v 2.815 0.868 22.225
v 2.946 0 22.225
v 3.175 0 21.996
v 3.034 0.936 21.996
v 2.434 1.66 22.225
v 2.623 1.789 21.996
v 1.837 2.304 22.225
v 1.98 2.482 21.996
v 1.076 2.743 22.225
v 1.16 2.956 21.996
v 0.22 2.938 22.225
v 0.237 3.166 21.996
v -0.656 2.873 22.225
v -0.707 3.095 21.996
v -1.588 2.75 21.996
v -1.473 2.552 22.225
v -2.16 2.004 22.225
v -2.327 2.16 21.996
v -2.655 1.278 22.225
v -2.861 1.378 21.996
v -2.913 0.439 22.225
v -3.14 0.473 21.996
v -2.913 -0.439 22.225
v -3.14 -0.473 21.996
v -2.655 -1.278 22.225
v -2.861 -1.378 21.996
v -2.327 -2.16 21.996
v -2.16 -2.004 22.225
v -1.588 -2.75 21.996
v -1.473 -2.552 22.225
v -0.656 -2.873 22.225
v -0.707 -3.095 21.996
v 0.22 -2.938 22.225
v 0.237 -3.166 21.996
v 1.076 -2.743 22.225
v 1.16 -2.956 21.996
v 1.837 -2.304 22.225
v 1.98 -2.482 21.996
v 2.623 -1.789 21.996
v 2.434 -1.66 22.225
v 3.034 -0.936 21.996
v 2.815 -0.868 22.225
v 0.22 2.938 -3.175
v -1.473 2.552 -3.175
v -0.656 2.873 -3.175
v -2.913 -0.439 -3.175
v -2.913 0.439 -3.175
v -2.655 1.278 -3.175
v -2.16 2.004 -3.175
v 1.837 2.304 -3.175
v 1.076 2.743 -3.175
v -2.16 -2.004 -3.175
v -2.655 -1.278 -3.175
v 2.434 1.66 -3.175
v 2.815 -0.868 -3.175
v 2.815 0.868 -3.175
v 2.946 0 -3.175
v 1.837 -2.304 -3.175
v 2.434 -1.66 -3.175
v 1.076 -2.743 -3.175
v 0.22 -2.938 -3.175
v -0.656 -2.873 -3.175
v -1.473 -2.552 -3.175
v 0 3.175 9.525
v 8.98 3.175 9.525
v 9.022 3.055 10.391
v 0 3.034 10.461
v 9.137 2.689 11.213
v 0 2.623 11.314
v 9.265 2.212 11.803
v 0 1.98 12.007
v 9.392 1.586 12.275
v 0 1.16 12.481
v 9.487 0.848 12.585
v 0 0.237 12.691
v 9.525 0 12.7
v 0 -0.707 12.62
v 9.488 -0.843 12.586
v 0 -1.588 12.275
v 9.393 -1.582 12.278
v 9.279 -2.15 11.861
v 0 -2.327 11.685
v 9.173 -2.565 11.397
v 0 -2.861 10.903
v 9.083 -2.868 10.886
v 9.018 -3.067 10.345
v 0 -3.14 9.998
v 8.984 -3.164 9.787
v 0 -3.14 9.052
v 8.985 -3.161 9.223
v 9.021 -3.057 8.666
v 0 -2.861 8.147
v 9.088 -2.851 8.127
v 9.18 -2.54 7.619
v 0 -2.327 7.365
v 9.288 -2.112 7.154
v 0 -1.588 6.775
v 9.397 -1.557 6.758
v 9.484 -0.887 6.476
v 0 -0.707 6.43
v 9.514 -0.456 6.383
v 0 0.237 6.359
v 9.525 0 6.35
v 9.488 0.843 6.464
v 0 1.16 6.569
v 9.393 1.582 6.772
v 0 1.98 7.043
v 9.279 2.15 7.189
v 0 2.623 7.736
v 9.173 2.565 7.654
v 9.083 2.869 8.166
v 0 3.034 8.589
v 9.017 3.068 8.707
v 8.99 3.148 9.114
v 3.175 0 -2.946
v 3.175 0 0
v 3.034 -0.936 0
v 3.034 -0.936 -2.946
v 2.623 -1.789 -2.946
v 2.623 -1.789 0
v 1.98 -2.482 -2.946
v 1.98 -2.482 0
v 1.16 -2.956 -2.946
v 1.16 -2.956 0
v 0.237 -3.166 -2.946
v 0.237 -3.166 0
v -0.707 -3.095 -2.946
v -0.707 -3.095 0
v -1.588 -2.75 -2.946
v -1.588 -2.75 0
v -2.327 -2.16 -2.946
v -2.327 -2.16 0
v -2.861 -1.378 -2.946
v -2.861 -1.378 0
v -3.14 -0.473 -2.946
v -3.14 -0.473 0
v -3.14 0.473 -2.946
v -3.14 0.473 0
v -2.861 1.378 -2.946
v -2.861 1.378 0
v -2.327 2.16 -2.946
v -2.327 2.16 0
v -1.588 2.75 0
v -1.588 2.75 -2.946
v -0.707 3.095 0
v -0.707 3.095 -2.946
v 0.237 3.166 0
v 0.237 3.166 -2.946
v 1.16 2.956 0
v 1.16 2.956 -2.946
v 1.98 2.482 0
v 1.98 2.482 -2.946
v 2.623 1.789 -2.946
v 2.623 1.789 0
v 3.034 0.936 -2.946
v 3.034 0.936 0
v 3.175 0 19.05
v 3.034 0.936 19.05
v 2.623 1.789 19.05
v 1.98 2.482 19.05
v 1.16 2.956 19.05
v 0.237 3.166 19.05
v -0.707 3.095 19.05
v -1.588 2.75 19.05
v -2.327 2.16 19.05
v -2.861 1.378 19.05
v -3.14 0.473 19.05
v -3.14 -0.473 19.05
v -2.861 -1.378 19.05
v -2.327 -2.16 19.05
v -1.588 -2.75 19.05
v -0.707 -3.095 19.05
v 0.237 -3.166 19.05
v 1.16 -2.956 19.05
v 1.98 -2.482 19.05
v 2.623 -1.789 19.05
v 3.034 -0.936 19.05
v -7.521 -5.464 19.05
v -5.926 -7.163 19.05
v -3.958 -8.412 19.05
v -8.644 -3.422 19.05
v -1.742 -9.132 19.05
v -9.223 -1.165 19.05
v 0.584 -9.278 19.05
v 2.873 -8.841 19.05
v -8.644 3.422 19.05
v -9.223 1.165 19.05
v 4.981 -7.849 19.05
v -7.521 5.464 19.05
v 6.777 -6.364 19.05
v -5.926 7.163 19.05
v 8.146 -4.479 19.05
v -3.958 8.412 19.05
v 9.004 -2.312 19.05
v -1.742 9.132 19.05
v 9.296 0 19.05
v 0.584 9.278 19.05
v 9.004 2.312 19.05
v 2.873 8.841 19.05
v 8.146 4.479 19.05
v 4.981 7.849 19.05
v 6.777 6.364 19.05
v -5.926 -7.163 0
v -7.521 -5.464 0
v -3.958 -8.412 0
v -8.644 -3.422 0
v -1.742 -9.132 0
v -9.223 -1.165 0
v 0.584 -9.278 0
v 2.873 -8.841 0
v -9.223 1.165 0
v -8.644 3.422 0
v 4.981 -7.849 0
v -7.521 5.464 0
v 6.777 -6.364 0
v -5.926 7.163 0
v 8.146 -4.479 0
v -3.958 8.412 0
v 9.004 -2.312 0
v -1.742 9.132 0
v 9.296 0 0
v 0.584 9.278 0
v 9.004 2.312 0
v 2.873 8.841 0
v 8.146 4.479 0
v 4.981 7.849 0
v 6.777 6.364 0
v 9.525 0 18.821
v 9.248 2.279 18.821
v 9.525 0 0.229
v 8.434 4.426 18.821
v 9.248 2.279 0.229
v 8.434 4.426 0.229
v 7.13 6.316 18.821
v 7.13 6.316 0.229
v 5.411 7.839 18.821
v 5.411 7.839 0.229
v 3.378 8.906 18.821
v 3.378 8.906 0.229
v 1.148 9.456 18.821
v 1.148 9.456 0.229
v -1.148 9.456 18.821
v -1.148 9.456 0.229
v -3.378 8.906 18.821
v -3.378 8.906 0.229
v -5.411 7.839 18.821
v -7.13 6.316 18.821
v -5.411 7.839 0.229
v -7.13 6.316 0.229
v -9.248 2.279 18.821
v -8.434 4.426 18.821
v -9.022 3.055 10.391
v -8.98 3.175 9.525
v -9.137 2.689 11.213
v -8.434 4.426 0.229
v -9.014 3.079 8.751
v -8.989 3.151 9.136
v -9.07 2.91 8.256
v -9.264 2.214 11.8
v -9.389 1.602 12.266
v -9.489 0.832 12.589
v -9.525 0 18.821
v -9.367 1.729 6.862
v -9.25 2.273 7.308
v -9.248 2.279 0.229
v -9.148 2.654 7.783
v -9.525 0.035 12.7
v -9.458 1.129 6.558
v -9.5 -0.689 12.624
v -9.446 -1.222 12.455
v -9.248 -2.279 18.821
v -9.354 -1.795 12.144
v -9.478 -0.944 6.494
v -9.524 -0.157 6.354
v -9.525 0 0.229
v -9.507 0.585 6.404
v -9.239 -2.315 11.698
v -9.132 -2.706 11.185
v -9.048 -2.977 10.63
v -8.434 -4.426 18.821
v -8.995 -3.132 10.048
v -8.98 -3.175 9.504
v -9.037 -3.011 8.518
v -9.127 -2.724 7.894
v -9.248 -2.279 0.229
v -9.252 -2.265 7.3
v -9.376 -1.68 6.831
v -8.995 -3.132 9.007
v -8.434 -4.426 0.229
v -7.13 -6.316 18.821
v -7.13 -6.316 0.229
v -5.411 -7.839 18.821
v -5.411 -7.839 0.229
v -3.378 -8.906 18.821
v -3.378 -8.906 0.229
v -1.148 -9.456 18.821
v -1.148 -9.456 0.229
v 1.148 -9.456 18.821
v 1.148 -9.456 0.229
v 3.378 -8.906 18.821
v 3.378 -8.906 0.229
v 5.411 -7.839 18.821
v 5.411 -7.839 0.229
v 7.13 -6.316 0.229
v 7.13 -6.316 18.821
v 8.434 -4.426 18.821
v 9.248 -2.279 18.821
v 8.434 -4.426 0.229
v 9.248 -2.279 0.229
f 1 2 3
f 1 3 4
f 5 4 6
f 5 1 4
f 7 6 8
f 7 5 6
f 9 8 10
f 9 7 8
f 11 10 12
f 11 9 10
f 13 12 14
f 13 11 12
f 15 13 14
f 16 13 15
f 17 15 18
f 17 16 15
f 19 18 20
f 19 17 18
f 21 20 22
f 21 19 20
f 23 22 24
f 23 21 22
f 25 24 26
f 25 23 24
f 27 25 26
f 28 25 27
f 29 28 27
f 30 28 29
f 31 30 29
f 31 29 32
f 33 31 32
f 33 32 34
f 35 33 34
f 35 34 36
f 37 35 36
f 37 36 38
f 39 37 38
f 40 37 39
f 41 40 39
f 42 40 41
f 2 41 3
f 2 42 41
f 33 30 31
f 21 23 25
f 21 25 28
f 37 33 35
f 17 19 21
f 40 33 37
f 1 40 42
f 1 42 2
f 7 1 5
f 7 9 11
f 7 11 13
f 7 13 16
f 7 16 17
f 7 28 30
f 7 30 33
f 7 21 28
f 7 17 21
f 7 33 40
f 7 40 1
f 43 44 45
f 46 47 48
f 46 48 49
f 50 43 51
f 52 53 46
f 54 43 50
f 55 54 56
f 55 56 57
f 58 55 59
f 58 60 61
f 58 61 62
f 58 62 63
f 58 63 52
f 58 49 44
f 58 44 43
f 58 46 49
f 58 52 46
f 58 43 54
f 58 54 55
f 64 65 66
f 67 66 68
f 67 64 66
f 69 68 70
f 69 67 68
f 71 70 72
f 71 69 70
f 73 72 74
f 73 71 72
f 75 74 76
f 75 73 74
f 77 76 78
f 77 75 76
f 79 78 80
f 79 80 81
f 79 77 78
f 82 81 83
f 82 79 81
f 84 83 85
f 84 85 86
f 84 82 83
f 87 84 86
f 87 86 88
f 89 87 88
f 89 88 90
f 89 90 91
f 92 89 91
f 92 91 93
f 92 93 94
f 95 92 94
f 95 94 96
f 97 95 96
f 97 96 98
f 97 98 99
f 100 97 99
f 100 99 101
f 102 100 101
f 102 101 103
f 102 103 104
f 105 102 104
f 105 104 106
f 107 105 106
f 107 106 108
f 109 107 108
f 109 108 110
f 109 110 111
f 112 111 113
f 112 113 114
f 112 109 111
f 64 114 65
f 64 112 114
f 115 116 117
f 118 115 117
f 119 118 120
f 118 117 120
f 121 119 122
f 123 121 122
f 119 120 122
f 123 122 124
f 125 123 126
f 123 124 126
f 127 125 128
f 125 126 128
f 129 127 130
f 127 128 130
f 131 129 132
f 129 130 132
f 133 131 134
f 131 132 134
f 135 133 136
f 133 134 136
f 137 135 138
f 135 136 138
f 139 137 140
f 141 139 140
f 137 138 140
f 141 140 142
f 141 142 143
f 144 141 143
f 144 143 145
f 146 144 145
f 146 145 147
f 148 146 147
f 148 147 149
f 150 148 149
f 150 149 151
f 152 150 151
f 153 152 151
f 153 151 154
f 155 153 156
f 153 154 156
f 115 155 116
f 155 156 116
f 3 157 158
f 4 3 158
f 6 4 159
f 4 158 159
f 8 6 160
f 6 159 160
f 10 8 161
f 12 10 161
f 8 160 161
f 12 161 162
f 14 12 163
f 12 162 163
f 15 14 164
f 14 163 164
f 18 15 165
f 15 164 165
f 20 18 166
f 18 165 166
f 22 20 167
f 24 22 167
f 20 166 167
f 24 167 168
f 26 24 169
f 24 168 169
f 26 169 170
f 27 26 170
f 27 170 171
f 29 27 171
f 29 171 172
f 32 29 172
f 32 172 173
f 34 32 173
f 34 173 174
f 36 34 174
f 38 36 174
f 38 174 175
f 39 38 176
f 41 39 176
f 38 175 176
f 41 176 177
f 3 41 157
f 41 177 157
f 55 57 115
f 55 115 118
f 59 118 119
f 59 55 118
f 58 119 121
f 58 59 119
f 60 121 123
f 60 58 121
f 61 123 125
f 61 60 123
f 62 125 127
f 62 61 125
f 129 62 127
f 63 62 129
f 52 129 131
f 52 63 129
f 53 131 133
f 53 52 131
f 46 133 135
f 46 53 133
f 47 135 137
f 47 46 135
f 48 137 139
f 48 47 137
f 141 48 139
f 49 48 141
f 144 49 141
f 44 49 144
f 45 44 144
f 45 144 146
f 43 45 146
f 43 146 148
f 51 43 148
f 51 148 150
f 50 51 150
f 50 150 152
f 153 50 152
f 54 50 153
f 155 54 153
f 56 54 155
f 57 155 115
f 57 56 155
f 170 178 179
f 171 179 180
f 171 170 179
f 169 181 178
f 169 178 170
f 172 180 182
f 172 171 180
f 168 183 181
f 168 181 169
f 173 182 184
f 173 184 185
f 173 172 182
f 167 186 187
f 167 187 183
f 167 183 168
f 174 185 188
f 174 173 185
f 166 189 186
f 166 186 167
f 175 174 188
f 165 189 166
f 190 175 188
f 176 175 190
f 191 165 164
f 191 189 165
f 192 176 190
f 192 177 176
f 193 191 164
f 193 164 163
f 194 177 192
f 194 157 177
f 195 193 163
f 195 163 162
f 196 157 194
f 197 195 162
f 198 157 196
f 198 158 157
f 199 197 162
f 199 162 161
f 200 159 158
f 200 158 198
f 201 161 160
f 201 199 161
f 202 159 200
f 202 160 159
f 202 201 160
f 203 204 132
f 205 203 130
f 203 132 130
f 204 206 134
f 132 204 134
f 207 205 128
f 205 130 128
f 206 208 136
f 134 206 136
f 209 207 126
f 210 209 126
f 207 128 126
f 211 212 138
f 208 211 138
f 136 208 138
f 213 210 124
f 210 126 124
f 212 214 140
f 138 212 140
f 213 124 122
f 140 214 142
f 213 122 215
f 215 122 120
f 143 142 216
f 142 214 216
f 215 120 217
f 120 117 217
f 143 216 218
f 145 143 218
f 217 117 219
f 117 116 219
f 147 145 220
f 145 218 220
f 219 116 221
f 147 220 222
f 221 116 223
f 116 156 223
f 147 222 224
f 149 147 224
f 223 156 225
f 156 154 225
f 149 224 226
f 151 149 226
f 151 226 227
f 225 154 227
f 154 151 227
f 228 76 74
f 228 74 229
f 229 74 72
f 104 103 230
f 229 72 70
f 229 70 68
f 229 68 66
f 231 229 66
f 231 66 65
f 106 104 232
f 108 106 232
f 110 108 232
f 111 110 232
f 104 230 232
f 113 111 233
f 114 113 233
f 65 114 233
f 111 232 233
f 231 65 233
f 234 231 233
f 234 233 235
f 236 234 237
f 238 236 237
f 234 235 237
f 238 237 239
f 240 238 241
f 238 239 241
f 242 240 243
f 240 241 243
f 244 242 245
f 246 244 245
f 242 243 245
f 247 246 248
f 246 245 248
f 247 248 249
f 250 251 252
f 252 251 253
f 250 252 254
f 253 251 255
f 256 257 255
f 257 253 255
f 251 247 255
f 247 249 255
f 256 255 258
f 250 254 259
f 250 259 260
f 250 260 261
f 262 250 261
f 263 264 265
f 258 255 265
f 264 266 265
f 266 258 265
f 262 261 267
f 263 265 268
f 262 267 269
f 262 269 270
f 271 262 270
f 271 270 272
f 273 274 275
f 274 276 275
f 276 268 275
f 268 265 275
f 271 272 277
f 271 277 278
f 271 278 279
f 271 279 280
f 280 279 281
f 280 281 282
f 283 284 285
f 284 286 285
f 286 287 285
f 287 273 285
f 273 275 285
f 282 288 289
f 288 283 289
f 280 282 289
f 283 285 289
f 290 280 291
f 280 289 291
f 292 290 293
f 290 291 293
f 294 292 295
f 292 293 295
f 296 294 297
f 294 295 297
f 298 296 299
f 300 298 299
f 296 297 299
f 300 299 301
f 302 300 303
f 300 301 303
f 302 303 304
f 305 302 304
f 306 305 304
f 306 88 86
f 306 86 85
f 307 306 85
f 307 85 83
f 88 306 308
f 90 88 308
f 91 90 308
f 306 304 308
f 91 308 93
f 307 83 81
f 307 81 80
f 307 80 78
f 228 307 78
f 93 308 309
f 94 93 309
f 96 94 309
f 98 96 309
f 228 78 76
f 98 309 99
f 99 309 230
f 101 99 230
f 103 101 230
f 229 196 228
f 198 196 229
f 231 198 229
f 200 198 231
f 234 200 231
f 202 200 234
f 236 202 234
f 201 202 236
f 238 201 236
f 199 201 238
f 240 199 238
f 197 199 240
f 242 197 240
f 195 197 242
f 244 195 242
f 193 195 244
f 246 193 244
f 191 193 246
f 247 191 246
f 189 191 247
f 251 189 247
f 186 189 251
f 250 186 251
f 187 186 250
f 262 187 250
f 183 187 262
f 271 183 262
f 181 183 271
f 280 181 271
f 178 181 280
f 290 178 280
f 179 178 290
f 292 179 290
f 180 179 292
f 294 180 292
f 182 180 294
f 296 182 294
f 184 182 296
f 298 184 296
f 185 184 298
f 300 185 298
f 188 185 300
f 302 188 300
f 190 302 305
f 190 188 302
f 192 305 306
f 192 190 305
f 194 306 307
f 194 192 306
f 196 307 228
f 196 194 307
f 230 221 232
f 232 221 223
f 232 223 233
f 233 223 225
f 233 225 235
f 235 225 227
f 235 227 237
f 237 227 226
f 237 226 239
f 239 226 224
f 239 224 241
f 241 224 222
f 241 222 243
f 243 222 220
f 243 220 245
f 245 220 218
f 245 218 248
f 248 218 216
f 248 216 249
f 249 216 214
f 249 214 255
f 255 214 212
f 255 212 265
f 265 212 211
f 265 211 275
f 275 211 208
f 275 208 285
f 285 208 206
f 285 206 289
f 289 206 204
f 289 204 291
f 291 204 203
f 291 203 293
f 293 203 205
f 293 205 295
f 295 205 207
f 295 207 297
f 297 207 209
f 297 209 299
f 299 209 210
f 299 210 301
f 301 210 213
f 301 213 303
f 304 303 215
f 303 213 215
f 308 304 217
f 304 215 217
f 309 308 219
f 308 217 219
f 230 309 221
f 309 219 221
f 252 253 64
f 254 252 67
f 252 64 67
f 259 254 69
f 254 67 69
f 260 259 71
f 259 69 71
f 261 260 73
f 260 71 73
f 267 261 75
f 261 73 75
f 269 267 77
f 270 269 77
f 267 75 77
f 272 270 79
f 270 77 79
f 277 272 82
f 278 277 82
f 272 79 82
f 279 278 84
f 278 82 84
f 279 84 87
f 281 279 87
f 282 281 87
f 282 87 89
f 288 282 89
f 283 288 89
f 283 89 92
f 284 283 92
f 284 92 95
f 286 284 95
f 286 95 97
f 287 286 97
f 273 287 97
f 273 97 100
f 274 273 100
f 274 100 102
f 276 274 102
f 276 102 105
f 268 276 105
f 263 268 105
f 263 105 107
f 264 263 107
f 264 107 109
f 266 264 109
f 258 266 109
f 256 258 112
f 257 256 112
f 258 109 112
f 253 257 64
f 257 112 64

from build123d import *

# Parameters (mm, degrees)
F0_R          = 9.525
F1_DEPTH      = 19.05
F2_R          = 3.175
F3_DEPTH      = 3.175
F4_R          = 3.175
F5_DEPTH      = 3.175
F6_R          = 3.175
F7_DEPTH      = 9.526
F7_DEPTH_BACK = 25.4
F8_SIZE       = 0.2286


with BuildPart() as f1:
    # F0 (on Top) → F1 (new body)
    with BuildSketch(Plane.XY):
        Circle(F0_R)
    extrude(amount=F1_DEPTH)

    # F2 (on face) → F3 (join)
    with BuildSketch(Plane.XY.offset(19.05)):
        Circle(F2_R)
    extrude(amount=F3_DEPTH)

    # F4 (on face) → F5 (join)
    with BuildSketch(Plane(origin=(0, 0, 0), x_dir=(1, 0, 0), z_dir=(0, 0, -1))):
        Circle(F4_R)
    extrude(amount=F5_DEPTH)

    # F6 (on Right) → F7 (cut, two sides)
    with BuildSketch(Plane.YZ) as f7_sk:
        with Locations((0, 9.525)):
            Circle(F6_R)
    extrude(amount=-F7_DEPTH, mode=Mode.SUBTRACT)
    extrude(f7_sk.sketch, amount=F7_DEPTH_BACK, mode=Mode.SUBTRACT)

    # F8
    f8_edges = [f1.edges().sort_by_distance(p)[0] for p in [
        (-3.175, 0, 22.225),
        (-9.525, 0, 19.05),
        (-3.175, 0, -3.175),
        (-9.525, 0, 0),
    ]]
    chamfer(f8_edges, length=F8_SIZE)


solid = f1.part
